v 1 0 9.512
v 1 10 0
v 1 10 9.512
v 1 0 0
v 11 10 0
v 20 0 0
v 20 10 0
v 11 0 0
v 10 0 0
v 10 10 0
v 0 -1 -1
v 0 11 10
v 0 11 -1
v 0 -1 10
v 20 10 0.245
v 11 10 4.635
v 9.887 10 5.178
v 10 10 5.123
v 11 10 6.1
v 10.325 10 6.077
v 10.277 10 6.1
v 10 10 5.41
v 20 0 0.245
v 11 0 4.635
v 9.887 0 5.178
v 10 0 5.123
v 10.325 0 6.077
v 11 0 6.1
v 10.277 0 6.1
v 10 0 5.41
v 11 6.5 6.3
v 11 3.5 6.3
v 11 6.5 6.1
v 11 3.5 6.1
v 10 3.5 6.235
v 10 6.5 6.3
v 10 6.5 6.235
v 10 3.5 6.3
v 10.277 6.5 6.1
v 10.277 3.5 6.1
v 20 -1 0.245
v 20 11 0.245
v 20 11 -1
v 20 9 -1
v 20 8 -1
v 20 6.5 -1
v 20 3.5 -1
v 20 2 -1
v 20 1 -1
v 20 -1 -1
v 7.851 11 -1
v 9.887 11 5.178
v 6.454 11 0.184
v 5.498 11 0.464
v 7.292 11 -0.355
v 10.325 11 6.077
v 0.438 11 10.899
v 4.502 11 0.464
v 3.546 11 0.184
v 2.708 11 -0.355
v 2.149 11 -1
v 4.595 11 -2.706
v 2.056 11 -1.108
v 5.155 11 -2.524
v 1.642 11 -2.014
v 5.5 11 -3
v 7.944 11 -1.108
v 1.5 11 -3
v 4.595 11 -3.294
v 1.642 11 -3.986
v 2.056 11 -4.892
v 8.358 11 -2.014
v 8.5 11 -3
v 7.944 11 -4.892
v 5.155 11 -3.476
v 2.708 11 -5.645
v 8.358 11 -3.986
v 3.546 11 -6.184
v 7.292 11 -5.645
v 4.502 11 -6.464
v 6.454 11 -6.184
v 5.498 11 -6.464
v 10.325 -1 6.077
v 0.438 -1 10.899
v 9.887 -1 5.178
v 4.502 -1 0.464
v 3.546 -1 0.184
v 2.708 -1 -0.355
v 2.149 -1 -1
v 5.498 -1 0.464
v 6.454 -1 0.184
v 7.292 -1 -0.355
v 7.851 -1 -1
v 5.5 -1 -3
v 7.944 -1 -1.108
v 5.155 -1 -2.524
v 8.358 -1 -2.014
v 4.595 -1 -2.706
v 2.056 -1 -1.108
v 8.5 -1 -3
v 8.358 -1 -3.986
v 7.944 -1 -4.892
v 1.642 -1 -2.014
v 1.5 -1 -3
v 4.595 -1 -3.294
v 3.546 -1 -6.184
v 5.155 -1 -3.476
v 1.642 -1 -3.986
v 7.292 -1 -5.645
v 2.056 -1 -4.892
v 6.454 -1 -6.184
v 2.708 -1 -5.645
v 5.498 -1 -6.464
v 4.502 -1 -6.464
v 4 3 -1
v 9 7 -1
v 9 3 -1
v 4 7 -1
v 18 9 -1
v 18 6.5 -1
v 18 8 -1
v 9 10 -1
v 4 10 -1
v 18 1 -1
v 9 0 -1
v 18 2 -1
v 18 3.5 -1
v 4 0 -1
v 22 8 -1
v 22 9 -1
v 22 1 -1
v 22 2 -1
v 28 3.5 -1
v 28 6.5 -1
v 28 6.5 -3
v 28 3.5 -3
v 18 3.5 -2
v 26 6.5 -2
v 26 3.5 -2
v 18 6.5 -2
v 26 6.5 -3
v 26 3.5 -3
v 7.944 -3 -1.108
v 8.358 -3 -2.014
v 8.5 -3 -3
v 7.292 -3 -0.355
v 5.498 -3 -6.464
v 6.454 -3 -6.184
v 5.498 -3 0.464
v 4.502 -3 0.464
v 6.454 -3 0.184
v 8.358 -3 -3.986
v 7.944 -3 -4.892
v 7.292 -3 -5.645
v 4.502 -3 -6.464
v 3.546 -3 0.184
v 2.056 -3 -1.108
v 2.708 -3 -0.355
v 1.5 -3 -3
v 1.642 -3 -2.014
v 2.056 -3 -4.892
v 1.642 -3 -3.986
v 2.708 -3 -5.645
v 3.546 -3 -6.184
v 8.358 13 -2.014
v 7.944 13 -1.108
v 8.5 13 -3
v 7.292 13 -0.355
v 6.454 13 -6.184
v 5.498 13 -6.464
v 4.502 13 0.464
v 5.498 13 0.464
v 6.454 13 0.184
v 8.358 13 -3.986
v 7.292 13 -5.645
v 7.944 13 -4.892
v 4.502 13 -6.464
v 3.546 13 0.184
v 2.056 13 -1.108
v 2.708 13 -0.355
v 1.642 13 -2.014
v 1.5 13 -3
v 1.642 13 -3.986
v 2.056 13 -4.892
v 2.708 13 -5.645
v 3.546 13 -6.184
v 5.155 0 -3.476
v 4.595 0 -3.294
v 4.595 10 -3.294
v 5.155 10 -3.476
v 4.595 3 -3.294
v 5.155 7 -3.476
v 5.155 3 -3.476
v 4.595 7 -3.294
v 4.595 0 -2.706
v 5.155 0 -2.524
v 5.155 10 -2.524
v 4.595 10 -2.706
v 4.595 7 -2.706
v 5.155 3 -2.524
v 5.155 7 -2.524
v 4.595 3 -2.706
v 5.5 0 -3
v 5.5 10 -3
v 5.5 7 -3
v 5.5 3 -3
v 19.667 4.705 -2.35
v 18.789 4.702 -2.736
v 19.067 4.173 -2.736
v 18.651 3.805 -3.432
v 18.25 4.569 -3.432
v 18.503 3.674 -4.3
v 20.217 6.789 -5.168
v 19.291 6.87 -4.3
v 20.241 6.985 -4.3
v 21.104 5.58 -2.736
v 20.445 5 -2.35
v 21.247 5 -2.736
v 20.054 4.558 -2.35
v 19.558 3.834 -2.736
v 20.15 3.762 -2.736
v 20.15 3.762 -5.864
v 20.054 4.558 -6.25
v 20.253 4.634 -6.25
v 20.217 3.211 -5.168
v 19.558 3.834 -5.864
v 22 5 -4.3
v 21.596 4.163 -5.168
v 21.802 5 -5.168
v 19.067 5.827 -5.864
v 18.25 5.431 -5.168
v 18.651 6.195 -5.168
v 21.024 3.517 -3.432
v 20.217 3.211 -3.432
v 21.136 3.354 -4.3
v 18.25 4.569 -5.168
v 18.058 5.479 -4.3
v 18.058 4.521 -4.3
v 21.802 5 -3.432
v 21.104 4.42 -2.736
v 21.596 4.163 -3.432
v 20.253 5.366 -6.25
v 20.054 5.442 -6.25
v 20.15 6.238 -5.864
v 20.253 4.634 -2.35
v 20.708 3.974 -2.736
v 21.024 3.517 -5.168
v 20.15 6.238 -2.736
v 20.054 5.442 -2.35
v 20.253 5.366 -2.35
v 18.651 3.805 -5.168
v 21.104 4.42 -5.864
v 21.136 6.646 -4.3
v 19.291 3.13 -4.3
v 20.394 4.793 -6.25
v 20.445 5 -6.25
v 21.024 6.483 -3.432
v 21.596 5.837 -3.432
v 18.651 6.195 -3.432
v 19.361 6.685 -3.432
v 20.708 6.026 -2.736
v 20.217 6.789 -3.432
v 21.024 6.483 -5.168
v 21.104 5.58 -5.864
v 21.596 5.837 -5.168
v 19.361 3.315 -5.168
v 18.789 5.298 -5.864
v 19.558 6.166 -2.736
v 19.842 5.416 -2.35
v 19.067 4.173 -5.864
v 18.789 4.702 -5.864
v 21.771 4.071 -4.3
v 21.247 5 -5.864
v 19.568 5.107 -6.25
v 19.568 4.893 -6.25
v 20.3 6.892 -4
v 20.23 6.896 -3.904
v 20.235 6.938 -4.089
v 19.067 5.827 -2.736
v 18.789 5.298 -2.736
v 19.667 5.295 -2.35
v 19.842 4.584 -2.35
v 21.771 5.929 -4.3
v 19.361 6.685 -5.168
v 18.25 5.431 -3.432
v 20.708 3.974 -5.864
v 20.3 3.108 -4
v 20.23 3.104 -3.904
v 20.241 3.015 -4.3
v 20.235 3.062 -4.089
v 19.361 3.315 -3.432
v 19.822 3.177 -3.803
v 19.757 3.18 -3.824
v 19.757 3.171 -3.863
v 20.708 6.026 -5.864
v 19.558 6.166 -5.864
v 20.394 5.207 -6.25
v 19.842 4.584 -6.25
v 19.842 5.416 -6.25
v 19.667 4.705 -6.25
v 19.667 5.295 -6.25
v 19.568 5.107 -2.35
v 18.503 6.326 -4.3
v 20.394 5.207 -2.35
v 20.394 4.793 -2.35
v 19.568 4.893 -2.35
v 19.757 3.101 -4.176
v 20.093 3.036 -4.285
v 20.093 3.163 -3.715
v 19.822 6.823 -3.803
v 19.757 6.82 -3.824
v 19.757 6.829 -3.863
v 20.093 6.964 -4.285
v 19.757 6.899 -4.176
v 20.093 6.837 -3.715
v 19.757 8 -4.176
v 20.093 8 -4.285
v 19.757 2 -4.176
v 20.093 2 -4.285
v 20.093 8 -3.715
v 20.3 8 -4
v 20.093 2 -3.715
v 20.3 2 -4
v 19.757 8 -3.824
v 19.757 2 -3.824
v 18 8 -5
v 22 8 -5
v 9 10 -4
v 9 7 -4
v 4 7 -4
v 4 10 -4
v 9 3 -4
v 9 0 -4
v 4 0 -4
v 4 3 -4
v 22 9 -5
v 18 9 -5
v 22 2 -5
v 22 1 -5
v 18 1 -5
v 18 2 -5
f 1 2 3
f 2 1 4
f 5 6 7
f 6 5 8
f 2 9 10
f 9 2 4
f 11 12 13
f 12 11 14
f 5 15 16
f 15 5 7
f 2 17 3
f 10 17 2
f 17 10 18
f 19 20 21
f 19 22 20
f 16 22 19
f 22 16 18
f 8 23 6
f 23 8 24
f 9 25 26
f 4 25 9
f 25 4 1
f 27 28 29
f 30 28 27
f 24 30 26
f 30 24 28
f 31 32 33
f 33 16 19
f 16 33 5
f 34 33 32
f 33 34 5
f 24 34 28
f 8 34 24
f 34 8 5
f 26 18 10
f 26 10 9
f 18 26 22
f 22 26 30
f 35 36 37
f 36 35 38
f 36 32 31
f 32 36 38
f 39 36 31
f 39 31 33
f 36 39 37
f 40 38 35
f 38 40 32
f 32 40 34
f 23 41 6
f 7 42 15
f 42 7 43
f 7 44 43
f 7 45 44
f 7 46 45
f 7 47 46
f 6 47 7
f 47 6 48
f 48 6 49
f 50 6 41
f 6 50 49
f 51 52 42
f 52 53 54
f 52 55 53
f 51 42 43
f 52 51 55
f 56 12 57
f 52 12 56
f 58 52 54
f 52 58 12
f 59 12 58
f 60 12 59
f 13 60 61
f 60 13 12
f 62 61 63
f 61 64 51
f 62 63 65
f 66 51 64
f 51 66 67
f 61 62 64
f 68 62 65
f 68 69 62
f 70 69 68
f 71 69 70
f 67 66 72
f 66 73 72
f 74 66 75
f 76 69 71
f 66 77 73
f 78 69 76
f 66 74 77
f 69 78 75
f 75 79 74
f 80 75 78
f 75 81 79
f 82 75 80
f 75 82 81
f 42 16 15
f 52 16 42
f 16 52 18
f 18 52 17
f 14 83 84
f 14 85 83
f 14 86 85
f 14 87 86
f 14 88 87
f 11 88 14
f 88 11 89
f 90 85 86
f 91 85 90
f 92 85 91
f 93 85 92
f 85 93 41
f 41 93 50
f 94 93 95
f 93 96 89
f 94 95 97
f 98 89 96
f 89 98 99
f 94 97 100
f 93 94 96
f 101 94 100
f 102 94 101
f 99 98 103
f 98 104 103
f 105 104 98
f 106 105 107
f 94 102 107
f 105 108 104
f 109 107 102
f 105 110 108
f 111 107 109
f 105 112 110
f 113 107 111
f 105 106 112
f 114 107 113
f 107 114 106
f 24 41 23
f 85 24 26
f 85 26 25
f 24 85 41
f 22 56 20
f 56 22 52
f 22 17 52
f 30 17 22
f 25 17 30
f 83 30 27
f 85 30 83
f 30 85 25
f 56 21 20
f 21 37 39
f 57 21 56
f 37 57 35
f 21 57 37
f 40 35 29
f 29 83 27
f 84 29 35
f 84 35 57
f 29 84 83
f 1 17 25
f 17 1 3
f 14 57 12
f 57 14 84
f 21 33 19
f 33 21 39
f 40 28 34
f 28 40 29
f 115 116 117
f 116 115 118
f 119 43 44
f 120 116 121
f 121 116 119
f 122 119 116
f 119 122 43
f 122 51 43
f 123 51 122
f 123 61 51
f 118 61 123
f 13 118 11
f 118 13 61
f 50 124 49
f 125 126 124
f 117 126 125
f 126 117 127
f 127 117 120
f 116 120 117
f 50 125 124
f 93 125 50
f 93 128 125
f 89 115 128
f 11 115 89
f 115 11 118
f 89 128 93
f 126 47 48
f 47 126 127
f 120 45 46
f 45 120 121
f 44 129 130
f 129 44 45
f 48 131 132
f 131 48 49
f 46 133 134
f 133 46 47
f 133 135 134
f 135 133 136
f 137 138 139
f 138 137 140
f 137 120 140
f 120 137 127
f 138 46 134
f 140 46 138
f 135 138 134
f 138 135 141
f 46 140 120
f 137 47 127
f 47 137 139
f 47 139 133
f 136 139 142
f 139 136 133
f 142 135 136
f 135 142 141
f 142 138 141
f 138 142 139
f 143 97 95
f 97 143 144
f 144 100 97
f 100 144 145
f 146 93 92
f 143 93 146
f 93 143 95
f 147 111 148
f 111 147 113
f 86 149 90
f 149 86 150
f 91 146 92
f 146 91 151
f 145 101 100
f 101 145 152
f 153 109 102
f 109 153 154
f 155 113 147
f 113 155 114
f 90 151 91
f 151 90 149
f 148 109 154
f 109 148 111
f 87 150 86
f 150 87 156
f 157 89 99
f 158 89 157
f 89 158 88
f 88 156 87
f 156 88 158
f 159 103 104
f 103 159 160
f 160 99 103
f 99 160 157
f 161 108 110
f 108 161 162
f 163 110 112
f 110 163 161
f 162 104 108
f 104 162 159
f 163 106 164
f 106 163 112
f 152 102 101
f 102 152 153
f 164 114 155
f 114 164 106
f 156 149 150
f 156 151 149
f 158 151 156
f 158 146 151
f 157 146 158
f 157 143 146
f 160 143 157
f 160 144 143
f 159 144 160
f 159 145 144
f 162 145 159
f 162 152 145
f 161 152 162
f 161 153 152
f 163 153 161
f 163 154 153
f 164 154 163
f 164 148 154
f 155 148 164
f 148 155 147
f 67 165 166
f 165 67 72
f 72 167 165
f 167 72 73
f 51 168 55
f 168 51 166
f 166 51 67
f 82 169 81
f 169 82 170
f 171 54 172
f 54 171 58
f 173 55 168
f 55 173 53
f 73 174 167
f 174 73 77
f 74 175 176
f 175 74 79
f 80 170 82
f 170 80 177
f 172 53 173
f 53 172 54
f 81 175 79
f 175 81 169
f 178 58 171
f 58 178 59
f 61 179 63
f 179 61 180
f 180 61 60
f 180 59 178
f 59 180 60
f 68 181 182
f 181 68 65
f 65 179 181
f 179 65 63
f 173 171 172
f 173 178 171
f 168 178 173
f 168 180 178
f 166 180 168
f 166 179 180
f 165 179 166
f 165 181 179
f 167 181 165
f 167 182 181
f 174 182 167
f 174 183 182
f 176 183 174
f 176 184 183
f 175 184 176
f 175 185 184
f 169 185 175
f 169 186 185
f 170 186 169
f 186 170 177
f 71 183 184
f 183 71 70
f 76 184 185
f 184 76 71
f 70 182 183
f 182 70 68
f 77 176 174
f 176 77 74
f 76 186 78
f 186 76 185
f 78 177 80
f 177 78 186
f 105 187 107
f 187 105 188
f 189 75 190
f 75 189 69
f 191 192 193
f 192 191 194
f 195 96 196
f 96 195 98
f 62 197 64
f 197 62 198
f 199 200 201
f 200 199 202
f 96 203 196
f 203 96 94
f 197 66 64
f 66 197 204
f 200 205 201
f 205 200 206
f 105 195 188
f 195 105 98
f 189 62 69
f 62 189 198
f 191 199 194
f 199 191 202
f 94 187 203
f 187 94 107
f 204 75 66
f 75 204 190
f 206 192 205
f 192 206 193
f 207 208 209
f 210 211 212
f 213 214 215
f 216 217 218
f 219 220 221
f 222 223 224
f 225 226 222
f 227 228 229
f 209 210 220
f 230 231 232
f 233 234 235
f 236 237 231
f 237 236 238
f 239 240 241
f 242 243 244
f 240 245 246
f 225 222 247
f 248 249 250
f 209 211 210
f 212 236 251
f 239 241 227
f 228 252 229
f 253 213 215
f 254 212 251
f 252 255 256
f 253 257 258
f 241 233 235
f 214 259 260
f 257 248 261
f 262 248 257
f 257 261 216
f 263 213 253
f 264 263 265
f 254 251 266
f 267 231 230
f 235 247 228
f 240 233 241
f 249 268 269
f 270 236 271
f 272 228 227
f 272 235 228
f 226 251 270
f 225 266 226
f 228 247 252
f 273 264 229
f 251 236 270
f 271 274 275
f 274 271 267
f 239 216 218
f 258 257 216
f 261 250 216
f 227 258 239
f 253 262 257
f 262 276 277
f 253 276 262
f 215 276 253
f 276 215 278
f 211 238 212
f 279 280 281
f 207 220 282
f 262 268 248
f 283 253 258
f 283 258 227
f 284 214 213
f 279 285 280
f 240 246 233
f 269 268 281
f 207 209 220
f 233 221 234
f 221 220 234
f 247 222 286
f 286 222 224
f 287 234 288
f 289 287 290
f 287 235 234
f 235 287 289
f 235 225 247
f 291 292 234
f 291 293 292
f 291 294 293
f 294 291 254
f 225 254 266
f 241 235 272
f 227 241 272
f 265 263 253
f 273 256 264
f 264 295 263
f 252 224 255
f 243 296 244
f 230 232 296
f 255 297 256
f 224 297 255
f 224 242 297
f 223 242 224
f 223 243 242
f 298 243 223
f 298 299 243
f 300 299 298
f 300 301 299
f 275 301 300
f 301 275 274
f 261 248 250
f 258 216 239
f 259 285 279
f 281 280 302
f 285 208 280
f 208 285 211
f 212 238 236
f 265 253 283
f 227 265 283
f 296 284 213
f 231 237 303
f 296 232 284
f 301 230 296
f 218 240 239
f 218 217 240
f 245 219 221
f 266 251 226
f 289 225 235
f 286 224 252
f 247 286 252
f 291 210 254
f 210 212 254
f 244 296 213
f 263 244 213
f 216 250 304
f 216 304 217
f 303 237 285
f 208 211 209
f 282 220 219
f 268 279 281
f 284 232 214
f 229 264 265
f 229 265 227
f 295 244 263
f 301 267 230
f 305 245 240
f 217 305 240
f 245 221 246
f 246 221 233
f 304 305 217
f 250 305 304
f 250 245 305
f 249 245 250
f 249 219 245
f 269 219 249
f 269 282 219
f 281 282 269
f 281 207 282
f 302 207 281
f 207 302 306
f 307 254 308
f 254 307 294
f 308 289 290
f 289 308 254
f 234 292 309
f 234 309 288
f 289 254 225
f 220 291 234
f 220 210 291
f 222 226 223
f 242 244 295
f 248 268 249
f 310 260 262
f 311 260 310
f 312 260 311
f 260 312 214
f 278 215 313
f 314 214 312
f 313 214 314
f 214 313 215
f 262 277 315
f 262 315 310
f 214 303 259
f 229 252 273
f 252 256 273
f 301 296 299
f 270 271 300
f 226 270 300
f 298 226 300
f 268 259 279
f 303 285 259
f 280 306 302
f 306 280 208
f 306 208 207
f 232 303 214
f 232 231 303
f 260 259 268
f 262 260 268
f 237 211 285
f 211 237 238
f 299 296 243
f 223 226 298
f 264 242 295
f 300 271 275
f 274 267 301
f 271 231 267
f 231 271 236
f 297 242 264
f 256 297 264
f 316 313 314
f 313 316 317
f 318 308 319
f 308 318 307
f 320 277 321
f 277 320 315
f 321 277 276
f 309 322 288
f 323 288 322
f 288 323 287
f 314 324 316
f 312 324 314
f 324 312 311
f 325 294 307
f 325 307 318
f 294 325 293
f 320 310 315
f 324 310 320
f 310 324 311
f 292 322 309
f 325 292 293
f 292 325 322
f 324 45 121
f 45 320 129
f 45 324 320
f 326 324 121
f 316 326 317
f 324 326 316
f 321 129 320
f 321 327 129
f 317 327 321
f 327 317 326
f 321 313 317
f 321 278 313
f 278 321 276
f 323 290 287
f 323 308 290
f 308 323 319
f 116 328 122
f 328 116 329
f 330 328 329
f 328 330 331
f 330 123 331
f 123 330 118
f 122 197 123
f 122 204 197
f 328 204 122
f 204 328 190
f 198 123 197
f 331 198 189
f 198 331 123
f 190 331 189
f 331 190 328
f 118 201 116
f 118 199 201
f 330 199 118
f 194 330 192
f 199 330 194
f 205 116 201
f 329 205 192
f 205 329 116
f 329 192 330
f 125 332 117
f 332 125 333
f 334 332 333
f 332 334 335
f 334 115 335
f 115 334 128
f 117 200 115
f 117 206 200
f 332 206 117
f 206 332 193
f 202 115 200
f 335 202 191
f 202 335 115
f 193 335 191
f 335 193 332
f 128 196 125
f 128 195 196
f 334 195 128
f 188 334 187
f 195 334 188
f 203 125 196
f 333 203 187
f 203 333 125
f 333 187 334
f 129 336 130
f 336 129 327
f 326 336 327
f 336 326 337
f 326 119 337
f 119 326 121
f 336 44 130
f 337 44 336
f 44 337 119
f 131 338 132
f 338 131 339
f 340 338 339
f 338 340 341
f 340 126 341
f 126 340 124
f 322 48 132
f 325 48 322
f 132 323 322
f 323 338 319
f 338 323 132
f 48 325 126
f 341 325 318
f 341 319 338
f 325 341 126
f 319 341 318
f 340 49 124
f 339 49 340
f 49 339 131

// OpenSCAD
//3d model of what the robot would've looked like
//obviously not to be printed out right away, but there's
//bits and pieces that can be used to print them out
//individualy so...
// :) 

//larger yellow square//////////////////
difference(){
color("steelblue")
cube(size=[1,10,10]);

translate([-.1,3.5,-2])
color("blue")
cube(size=[2,3,3]);

color("green")
translate([-1,9,2])
cube(size=[3,2,2]);

color("green")
translate([-1,-1,2])
cube(size=[3,2,2]);
}


//smaller yellow square//////////////
difference(){
	union(){
	color("steelblue")
	translate([10,0,0])
	cube(size=[1,10,4.8]);

	color("steelblue")
	translate([10,3.5,4.8])
	cube(size=[1,3,1.5]);
	}

color("green")
translate([9,-.5,1]) 
cube(size=[3,1,2]);

color("green")
translate([9.9,9,1])
cube(size=[2,2,2]);
}

/////sides///////////////////////
difference(){
	union(){
	color("lightgreen")
	translate([0,10,0])
	cube(size=[20,1,10]);

	color("lightgreen")
	translate([0,9,2])
	cube(size=[1,2,2]);

	color("lightgreen")
	translate([10,9,1])
	cube(size=[1,1,2]);
}

color("lightgreen")
translate([0,-1,10])
rotate([0,26,0])
cube([23,13,10]);

color("blue")
translate([2,9.9,-.1])
cube(size=[3,5,1]);

color("blue")
translate([11,9.9,-.1])
cube(size=[3,5,1]);
}
//----///-/-/-/-/--/--/-/-/-/-/-
difference(){
	union(){
	color("lightgreen")
	translate([0,-1,0])
	cube(size=[20,1,10]);

	color("lightgreen")
	translate([0,-1,2])
	cube(size=[1,2,2]);

	color("lightgreen")
	translate([10,-.5,1])
	cube(size=[1,1,2]);
	}

color("lightgreen")
translate([0,-1.5,10])
rotate([0,26,0])
cube([23,14,10]);

color("yellowgreen")
translate([2,-1.5,-.1])
cube(size=[3,5,1]);

color("yellowgreen")
translate([11,-1.5,-.1])
cube(size=[3,1.6,1]);
}

//////top thing///////////////////////////////
difference(){
	union() {
	color("skyblue")
	translate([0,-1,10])
	rotate([0,26,0])
	cube([11,12,1]);

	color("skyblue")
	translate([10,0,4.8])
	cube(size=[1,10,1.3]);
	}
color("steelblue")
translate([10,3.5,4.8])
cube(size=[3,3,1.5]);
}

//////base/////////////////////////////////
union(){
color("yellowgreen")
translate([0,-1,-1])
cube(size=[20,12,1]);

translate([0,3.5,0])
color("yellowgreen")
cube(size=[1,3,1]);

color("yellowgreen")
translate([2,10,0])
cube(size=[3,1,1]);

color("yellowgreen")
translate([11,10,0])
cube(size=[3,1,1]);

color("yellowgreen")
translate([2,-1,0])
cube(size=[3,1,1]);

color("yellowgreen")
translate([11,-1,0])
cube(size=[3,1,1]);
}
union(){
color("yellowgreen")
translate([18,3.5,-2])
cube(size=[10,3,1]);

color("yellowgreen")
translate([26,3.5,-3])
cube([2,3,1]);
}


/////////////////wheels (not for printing obviously)//////////////
translate([5,-1,-3])
color("darkolivegreen")
rotate([90,0,0])
cylinder(h=2, r=3.5,$fs=1);


translate([5,13,-3])
color("darkolivegreen")
rotate([90,0,0])
cylinder(h=2, r=3.5,$fs=1);

translate([5,12,-3])
color("darkolivegreen")
rotate([90,0,0])
cylinder(h=14, r=.5);

translate([20,5,-4.3])
color("darkolivegreen")
sphere(r=2,$fs=1);


translate([20,8,-4])
color("darkolivegreen")
rotate([90,0,0])
cylinder(h=6.9, r=.3);

//motors//
color("slategrey")
translate([4,7,-4])
cube([5,3,3]);

color("slategrey")
translate([4,0,-4])
cube([5,3,3]);

color("slategrey")
translate([18,8,-5])
cube([4,1,4]);

color("slategrey")
translate([18,1,-5])
cube([4,1,4]);
